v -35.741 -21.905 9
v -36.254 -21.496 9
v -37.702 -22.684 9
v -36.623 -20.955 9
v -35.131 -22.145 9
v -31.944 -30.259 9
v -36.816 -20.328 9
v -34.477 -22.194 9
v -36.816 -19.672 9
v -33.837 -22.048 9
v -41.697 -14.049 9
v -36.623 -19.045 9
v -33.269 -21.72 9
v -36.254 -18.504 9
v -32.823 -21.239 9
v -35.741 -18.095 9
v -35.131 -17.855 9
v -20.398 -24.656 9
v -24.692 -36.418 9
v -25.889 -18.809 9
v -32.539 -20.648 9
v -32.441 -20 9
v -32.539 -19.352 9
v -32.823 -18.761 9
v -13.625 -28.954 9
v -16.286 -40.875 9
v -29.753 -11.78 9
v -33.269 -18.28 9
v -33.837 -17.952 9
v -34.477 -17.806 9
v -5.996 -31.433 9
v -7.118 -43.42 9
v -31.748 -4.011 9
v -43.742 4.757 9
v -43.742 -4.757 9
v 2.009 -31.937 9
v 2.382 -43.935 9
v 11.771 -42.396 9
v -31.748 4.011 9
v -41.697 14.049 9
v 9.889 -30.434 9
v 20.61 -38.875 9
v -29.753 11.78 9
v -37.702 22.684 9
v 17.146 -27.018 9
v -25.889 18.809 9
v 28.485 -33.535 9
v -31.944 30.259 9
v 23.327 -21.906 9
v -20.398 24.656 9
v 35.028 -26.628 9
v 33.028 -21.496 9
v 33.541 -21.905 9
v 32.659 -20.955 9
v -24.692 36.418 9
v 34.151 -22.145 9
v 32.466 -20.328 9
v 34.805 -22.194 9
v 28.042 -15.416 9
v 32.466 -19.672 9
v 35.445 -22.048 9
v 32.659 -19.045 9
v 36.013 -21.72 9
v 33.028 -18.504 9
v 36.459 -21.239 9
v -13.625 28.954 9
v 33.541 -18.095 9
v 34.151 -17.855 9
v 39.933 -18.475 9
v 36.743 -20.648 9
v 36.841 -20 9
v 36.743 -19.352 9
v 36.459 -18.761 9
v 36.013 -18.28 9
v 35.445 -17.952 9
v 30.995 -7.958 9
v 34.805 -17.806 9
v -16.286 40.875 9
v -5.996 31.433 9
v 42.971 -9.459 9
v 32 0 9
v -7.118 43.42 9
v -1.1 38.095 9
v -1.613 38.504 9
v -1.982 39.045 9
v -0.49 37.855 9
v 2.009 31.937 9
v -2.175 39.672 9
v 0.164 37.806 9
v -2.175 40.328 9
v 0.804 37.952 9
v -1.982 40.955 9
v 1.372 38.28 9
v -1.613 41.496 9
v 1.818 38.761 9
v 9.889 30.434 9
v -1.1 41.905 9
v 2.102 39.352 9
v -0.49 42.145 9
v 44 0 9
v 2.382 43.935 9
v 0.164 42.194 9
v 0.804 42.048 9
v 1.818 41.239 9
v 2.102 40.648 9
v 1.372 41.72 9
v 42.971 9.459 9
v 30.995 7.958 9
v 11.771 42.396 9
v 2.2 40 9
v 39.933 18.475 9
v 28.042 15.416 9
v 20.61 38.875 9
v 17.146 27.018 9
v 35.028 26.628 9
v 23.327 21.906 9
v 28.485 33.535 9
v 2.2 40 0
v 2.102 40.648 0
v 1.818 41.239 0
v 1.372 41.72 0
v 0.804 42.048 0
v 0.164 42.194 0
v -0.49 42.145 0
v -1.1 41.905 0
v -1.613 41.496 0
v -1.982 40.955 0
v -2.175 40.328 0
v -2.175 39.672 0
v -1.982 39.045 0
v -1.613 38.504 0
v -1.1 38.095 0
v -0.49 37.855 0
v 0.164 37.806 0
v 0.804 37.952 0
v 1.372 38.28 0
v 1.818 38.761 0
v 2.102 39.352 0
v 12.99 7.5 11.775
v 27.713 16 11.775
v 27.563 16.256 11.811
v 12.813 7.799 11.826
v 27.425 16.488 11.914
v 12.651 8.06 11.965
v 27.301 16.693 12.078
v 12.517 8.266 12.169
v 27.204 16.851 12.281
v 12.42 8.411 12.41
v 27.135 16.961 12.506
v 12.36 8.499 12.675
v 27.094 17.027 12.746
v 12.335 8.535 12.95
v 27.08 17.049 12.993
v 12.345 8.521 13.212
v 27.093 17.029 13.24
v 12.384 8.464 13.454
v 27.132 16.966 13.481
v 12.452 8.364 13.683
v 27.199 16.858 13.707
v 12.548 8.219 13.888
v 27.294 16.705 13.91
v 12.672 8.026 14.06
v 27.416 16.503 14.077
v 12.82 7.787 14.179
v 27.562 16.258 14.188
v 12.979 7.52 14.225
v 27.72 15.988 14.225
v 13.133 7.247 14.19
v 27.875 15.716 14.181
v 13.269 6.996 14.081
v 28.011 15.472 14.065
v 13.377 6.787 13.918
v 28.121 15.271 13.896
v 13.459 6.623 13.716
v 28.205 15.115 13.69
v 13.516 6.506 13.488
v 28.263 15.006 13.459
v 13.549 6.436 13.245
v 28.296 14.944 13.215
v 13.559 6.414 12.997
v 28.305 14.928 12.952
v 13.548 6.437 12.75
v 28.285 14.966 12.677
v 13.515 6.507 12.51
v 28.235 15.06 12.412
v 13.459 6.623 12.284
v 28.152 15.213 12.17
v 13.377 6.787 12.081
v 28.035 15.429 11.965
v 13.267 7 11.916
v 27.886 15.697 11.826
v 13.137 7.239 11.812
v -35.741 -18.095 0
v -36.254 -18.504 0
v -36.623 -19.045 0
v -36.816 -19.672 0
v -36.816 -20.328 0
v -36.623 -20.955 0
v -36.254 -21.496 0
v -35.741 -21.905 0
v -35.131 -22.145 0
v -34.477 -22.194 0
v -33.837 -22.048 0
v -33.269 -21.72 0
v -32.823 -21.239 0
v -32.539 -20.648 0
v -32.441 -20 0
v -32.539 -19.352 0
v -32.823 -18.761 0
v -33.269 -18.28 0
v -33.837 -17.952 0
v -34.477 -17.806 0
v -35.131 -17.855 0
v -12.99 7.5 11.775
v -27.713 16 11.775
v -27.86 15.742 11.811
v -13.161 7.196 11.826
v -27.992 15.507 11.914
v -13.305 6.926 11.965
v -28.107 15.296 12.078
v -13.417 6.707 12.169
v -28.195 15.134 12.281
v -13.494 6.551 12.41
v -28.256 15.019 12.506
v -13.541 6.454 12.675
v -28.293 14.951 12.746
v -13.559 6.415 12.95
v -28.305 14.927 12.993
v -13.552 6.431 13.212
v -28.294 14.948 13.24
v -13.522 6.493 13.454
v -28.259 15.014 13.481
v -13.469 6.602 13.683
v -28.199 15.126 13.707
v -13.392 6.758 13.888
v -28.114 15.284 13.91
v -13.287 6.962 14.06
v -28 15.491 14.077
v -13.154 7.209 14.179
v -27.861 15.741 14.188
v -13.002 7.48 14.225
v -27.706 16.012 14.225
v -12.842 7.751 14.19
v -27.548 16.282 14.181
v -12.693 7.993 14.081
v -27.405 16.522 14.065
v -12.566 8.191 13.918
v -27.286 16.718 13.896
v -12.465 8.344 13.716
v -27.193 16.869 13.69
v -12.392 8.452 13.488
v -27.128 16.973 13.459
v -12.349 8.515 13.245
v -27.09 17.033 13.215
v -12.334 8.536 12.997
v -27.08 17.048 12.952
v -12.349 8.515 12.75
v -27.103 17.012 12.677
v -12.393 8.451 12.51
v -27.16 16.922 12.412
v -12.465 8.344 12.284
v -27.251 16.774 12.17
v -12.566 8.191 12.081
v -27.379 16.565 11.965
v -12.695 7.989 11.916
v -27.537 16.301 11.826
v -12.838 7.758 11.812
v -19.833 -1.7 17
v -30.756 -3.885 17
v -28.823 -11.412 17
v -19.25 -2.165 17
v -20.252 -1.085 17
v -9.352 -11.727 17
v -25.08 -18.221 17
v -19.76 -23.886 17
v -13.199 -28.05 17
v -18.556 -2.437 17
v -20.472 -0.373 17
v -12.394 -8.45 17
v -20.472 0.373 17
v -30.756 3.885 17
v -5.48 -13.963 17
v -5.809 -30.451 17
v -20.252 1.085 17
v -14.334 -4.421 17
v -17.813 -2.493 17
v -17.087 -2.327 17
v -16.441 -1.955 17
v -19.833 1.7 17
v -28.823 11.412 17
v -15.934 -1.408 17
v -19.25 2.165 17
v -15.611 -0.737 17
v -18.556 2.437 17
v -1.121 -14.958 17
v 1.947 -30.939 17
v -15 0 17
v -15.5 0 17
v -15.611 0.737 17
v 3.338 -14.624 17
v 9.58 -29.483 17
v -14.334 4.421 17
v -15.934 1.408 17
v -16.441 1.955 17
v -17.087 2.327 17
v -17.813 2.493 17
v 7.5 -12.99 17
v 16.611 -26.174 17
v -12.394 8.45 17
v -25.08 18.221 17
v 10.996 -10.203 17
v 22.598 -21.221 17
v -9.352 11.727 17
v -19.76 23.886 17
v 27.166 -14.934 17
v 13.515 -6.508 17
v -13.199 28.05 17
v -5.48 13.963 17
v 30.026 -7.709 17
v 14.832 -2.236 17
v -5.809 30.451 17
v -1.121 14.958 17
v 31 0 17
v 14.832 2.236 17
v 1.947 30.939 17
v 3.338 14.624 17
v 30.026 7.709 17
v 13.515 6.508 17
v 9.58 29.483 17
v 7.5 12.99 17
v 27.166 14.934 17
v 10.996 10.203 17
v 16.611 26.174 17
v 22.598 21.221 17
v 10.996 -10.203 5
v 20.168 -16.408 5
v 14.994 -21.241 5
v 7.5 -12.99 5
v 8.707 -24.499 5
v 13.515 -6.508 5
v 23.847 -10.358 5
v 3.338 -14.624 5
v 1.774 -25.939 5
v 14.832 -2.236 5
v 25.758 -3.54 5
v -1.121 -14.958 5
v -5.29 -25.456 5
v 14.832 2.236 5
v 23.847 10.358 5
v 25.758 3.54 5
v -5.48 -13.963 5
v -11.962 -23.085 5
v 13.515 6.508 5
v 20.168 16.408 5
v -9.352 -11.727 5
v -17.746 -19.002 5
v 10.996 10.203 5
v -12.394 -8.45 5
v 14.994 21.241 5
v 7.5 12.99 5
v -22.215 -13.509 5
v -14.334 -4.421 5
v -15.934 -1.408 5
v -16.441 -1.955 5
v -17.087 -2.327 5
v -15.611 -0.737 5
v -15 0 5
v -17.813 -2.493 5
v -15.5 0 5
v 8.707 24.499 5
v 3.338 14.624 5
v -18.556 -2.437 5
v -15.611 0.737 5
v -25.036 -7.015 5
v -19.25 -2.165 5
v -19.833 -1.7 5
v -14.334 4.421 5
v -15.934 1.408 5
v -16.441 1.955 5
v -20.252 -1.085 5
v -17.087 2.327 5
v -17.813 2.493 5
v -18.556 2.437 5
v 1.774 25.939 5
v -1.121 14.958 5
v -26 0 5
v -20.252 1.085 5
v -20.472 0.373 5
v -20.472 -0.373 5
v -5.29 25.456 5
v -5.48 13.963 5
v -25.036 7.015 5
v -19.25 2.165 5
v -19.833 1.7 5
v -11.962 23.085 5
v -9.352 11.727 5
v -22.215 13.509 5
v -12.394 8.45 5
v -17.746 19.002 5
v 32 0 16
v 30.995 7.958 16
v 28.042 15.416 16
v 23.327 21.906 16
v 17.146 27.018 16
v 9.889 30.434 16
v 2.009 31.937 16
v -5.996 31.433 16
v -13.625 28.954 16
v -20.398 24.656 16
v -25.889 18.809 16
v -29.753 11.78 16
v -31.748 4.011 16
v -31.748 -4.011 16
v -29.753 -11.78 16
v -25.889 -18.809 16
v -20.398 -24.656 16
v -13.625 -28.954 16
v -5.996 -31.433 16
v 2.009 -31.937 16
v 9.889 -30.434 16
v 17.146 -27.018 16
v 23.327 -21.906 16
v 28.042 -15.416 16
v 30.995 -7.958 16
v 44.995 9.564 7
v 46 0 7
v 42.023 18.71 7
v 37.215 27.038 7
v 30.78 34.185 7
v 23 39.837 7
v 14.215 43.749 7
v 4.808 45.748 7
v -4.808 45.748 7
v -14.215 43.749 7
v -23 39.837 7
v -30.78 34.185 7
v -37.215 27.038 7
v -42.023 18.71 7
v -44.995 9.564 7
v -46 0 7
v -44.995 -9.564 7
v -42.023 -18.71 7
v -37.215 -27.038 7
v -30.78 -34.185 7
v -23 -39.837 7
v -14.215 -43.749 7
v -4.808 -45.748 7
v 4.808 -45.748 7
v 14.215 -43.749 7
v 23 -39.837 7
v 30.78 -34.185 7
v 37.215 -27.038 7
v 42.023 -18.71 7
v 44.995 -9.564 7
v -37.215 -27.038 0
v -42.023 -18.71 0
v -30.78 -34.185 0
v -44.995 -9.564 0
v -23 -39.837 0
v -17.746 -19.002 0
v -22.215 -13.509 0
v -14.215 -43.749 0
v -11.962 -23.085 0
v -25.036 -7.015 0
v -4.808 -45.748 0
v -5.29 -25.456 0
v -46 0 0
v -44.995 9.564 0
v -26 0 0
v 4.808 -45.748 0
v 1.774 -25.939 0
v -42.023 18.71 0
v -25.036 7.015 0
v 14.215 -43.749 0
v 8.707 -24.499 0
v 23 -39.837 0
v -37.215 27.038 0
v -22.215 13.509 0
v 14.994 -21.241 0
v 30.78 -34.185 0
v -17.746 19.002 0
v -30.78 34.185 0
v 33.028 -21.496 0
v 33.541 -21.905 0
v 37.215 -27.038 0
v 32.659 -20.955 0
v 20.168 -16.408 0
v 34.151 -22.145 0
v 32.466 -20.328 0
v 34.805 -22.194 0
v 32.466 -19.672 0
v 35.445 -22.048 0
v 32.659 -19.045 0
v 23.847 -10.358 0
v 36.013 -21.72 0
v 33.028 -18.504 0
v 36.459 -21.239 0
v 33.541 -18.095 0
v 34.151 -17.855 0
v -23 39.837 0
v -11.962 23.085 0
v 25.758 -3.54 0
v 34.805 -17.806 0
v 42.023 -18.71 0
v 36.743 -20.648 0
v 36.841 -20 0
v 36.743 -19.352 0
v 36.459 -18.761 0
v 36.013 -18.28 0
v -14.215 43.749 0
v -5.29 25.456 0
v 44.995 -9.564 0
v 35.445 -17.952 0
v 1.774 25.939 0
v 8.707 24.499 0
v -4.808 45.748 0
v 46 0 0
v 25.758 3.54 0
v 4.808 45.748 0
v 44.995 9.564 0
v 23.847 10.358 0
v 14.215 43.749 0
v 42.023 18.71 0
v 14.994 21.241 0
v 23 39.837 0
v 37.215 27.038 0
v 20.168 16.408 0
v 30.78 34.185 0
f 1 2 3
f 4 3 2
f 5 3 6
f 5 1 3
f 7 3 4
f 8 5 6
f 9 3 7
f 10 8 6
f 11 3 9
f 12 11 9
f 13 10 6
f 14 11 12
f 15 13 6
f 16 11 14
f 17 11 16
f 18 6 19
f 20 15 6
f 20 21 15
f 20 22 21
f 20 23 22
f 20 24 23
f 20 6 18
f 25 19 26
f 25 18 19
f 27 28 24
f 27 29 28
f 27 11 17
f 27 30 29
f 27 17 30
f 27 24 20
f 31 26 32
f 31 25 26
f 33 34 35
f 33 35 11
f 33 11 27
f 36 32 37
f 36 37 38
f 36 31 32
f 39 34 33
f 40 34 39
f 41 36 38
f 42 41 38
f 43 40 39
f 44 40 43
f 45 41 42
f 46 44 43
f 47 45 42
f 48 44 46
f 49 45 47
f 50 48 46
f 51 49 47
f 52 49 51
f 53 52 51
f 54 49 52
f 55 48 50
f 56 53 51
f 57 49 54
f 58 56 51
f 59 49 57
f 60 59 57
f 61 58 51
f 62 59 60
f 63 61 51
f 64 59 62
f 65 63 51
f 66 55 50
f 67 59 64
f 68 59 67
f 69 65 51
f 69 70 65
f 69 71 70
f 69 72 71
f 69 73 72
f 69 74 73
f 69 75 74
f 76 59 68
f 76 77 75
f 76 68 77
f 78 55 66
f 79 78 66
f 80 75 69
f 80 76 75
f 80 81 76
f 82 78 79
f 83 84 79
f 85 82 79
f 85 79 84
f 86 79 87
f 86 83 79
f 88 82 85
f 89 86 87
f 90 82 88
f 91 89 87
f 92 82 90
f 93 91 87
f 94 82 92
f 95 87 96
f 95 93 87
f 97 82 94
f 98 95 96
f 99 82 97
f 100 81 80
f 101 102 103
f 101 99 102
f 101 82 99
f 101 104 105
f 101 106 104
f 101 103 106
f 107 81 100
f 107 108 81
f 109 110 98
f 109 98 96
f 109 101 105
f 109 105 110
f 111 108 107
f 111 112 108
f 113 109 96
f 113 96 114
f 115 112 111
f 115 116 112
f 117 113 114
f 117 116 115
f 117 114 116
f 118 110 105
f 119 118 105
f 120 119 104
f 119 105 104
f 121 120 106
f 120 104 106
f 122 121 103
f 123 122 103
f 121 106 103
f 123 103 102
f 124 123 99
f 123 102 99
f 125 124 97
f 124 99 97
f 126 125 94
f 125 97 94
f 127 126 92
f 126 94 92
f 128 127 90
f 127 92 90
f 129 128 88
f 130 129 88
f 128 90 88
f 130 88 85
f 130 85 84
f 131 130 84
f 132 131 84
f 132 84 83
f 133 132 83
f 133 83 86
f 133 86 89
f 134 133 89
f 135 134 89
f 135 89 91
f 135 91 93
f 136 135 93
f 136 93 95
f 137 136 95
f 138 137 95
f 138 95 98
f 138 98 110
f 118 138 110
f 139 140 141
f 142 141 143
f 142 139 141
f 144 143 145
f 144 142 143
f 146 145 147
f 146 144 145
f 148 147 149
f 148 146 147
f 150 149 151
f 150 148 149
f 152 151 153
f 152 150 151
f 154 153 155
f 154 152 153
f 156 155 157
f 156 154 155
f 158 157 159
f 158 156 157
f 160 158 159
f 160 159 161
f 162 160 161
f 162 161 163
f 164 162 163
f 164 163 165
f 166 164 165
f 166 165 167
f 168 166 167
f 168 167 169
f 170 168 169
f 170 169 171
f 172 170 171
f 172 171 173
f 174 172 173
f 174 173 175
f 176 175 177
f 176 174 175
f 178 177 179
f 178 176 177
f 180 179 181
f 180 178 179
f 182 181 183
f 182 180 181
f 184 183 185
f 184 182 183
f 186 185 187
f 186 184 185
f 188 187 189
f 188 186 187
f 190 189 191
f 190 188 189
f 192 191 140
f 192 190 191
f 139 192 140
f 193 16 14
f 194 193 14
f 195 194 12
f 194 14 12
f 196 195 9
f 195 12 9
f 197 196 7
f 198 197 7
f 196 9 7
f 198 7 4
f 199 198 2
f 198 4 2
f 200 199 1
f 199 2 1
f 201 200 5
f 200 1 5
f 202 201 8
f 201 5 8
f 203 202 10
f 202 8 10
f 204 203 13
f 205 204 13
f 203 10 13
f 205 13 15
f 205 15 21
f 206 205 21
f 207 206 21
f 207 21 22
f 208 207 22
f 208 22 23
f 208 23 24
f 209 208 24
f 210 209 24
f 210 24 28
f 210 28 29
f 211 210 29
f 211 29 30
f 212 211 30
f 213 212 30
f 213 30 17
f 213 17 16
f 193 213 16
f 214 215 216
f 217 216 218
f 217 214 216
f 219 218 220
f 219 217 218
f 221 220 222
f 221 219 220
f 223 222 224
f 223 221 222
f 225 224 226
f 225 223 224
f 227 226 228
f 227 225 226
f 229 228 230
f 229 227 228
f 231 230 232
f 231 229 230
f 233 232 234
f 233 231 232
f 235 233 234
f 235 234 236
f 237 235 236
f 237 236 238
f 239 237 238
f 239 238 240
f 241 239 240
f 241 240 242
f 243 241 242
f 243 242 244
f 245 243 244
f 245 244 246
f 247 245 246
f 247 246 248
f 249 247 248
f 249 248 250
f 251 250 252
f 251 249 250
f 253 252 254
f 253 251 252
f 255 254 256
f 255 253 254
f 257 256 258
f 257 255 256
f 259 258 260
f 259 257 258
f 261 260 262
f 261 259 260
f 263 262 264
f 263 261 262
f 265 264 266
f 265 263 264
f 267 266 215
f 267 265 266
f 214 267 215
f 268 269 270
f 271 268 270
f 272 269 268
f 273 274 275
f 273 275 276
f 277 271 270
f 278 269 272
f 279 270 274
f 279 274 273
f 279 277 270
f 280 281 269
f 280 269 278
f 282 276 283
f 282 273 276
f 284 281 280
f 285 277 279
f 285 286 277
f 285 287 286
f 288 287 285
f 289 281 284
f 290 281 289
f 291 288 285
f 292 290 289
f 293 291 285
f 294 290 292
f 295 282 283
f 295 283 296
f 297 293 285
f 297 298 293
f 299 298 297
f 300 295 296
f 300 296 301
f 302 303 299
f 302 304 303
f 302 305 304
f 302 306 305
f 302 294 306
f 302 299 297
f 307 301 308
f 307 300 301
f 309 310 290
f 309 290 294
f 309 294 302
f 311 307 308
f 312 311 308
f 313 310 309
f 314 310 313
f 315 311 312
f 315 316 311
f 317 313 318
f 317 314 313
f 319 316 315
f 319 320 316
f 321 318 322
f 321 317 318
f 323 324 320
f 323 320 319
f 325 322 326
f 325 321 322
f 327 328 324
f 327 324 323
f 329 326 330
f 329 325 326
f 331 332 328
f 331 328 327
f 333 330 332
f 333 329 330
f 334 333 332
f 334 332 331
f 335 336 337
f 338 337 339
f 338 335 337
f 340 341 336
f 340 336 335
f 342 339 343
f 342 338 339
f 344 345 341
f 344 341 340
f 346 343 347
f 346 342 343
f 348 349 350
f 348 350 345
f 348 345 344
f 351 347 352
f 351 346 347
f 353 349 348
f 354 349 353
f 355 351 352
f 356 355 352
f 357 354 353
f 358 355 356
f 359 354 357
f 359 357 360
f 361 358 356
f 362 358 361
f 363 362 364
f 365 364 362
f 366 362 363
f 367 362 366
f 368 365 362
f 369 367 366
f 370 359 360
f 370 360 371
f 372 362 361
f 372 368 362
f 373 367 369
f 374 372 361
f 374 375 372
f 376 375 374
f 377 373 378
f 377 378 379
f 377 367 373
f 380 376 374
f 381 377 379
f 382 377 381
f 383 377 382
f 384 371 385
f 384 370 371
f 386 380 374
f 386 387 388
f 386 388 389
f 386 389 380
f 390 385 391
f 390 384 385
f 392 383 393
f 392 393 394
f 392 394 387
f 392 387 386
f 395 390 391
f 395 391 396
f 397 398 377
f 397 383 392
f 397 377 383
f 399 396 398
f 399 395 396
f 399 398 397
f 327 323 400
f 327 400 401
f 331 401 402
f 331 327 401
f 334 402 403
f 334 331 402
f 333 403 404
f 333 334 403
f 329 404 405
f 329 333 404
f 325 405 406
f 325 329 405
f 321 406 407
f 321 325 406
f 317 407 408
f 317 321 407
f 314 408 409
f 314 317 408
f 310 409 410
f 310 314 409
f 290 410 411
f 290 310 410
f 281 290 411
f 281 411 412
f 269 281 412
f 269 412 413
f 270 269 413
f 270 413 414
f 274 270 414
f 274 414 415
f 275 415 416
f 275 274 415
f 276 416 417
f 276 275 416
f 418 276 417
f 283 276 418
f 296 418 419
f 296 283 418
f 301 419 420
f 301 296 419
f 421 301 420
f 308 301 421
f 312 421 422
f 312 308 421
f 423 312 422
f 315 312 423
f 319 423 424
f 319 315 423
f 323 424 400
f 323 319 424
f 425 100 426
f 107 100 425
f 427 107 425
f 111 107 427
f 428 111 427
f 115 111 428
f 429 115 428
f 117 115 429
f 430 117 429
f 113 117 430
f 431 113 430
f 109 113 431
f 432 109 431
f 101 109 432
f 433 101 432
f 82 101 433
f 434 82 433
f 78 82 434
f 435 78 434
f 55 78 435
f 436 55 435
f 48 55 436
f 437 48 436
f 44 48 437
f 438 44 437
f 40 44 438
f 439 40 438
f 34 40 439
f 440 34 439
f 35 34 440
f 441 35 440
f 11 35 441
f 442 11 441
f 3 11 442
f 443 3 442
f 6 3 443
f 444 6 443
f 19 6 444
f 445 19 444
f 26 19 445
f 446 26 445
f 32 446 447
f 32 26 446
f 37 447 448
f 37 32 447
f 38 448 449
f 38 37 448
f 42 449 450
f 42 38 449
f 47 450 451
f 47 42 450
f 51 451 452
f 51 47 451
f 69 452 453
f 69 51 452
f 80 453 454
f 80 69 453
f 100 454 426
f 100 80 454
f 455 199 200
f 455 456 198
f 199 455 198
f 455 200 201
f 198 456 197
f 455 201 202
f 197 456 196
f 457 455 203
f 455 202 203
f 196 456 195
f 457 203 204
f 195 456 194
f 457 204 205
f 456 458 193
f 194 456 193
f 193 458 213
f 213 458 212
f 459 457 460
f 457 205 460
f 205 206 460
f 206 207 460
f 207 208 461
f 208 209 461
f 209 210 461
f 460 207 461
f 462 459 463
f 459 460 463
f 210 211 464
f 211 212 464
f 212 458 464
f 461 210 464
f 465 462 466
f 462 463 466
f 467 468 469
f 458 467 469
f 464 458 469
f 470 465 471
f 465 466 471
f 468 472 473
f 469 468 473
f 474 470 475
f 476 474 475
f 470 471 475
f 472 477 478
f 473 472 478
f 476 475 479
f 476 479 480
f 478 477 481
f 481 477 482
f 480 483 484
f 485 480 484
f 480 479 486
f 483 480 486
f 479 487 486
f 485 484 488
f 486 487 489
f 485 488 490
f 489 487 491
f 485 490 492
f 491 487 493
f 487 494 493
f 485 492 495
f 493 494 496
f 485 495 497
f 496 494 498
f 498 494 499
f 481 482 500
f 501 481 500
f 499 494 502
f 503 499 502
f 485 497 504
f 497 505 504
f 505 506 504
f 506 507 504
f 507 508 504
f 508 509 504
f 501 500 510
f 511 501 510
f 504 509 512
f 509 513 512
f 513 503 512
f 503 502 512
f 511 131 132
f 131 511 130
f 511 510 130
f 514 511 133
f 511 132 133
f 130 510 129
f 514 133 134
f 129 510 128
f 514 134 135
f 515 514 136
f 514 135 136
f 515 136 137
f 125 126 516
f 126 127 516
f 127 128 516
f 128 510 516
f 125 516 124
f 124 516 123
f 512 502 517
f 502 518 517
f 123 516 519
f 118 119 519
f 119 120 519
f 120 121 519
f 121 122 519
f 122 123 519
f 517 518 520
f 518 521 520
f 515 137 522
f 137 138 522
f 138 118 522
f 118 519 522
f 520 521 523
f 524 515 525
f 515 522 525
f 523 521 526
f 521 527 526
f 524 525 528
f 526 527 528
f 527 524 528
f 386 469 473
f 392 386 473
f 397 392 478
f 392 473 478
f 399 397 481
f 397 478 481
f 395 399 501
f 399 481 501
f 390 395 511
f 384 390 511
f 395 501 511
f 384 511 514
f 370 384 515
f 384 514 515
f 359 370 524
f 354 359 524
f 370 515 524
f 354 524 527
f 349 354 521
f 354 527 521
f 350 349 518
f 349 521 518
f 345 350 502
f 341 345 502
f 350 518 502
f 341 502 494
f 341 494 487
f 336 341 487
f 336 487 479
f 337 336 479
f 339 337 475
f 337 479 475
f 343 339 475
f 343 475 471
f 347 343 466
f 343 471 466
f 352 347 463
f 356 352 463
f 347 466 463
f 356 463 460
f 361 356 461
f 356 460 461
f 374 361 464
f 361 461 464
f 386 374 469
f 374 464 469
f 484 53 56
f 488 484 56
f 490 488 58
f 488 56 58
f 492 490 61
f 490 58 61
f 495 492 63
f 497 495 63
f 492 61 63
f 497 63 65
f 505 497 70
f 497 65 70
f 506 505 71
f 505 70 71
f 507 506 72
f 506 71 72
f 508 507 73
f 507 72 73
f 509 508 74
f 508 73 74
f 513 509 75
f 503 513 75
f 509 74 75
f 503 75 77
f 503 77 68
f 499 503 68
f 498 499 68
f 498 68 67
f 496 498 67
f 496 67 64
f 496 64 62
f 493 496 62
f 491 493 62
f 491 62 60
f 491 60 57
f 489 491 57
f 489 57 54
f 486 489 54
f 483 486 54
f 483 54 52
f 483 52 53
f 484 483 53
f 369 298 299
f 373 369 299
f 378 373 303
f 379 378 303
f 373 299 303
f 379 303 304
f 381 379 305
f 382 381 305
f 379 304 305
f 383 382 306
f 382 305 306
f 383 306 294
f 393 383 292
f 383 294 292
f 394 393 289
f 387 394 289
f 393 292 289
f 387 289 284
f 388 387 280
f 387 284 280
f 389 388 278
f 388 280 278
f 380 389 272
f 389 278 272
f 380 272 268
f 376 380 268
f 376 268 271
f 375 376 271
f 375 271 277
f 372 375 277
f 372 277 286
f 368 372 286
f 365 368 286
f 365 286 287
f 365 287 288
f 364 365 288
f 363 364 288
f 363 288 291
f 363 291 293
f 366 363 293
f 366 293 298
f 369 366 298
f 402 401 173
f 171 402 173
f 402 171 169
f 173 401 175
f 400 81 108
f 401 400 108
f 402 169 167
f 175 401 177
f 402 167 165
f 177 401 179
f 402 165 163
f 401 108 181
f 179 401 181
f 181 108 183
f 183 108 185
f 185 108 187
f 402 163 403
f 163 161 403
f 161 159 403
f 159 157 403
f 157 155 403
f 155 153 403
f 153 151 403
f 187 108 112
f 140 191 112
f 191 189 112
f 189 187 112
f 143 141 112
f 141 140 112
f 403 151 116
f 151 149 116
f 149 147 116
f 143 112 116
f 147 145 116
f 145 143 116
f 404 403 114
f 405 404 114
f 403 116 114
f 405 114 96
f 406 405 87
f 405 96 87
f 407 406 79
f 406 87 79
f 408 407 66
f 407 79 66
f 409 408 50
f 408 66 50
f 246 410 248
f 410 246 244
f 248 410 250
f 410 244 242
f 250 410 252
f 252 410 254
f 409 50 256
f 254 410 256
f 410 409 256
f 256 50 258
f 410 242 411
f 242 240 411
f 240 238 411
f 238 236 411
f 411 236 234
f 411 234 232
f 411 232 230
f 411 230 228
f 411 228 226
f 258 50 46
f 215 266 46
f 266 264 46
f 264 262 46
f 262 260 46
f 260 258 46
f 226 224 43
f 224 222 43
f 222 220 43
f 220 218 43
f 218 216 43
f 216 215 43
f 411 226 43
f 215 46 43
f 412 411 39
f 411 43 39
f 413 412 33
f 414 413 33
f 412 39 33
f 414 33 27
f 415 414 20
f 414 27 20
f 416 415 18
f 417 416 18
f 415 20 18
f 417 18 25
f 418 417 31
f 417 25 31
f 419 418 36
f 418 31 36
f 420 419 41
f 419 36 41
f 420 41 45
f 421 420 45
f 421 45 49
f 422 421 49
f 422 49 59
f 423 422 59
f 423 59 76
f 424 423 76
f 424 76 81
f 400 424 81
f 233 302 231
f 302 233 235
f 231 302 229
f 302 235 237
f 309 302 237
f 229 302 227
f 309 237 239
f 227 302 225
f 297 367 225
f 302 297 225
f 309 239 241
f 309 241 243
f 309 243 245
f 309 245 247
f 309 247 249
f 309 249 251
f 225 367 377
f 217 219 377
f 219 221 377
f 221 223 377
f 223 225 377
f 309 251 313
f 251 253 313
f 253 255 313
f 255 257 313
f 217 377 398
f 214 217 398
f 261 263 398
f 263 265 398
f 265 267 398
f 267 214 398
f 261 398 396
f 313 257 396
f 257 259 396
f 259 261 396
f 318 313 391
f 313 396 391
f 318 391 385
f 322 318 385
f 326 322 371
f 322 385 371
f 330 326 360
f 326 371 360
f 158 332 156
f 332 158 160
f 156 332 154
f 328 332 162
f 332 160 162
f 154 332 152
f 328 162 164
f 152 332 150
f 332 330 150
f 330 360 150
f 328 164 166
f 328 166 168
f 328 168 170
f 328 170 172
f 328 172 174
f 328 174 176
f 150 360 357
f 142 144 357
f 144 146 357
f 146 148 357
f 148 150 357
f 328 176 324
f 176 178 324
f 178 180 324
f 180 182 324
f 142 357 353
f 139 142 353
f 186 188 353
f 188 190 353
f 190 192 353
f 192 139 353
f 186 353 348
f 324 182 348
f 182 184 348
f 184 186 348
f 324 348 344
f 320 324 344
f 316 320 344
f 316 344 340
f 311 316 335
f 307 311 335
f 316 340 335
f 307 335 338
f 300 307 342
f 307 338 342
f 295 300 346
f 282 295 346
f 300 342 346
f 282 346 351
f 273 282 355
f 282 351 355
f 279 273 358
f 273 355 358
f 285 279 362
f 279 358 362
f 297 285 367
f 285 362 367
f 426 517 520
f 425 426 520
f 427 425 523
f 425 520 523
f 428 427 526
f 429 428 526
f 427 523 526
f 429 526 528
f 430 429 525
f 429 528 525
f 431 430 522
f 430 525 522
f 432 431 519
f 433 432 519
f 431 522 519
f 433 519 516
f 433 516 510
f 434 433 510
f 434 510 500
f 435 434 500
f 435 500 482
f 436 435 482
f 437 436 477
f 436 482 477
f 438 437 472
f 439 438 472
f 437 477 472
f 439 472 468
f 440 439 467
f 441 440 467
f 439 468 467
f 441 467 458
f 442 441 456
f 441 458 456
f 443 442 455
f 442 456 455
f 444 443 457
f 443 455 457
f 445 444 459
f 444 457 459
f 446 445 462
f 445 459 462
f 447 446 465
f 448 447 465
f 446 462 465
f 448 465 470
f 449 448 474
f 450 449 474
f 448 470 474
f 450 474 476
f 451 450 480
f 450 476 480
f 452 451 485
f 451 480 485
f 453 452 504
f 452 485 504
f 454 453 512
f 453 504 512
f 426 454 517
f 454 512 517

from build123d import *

# Parameters (mm, degrees)
ESQUISSE1_R                  = 46
BASE_EXTRUSION_DEPTH         = 9
ESQUISSE2_R                  = 32
BOSS_EXTRU_1_DEPTH           = 8
ESQUISSE3_R                  = 26
ENL_V_MAT_EXTRU_1_DEPTH      = 5
ESQUISSE4_R                  = 15
ENL_V_MAT_EXTRU_2_DEPTH      = 13
ESQUISSE5_R                  = 2.2
ENL_V_MAT_EXTRU_3_DEPTH      = 10
R_P_TITION_CIRCULAIRE1_COUNT = 3
CHANFREIN1_SIZE              = 2
CHANFREIN2_SIZE              = 1
ENL_V_START                  = -17.050105
ESQUISSE8_R                  = 1.225
ENL_V_MAT_EXTRU_4_DEPTH      = 17.050105
R_P_TITION_CIRCULAIRE2_COUNT = 2
R_P_TITION_CIRCULAIRE2_ANGLE = 120
ESQUISSE9_R                  = 2.5
ENL_V_MAT_EXTRU_5_DEPTH      = 18


with BuildPart() as part:
    # Esquisse1 → Base-Extrusion (new body)
    with BuildSketch(Plane.XY):
        Circle(ESQUISSE1_R)
    extrude(amount=BASE_EXTRUSION_DEPTH)

    # Esquisse2 → Boss.-Extru.1 (add)
    with BuildSketch(Plane.XY.offset(9)):
        Circle(ESQUISSE2_R)
    extrude(amount=BOSS_EXTRU_1_DEPTH)

    # Esquisse3 → Enlèv. mat.-Extru.1 (cut)
    with BuildSketch(Plane(origin=(0, 0, 0), x_dir=(-1, 0, 0), z_dir=(0, 0, -1))):
        Circle(ESQUISSE3_R)
    extrude(amount=-ENL_V_MAT_EXTRU_1_DEPTH, mode=Mode.SUBTRACT)

    # Esquisse4 → Enlèv. mat.-Extru.2 (cut, through all)
    with BuildSketch(Plane(origin=(0, 0, 5), x_dir=(-1, 0, 0), z_dir=(0, 0, -1))):
        Circle(ESQUISSE4_R)
    extrude(amount=-ENL_V_MAT_EXTRU_2_DEPTH, mode=Mode.SUBTRACT)

    # Esquisse5 → Enlèv. mat.-Extru.3 (cut, through all)
    with BuildSketch(Plane.XY.offset(9)):
        with Locations((0, 40)):
            Circle(ESQUISSE5_R)
    enl_v_mat_extru_3 = extrude(amount=-ENL_V_MAT_EXTRU_3_DEPTH, mode=Mode.SUBTRACT)

    # Répétition circulaire1: Enlèv. mat.-Extru.3 ×3 about axis
    r_p_tition_circulaire1_axis = Axis((0, 0, 0), (0, 0, 1))
    for i in range(1, R_P_TITION_CIRCULAIRE1_COUNT):
        add(enl_v_mat_extru_3.rotate(r_p_tition_circulaire1_axis, i * 360 / R_P_TITION_CIRCULAIRE1_COUNT), mode=Mode.SUBTRACT)

    # Chanfrein1
    chanfrein1_edges = [part.edges().sort_by_distance(p)[0] for p in [
        (-46, 0, 9),
    ]]
    chamfer(chanfrein1_edges, length=CHANFREIN1_SIZE)

    # Chanfrein2
    chanfrein2_edges = [part.edges().sort_by_distance(p)[0] for p in [
        (-32, 0, 17),
    ]]
    chamfer(chanfrein2_edges, length=CHANFREIN2_SIZE)

    # Esquisse8 → Enlèv. mat.-Extru.4 (cut)
    with BuildSketch(Plane(origin=(27.712812921, 16, 0), x_dir=(0, 0, -1), z_dir=(0.866025404, 0.5, 0)).offset(ENL_V_START)):
        with Locations((-13, 0)):
            Circle(ESQUISSE8_R)
    enl_v_mat_extru_4 = extrude(amount=ENL_V_MAT_EXTRU_4_DEPTH, mode=Mode.SUBTRACT)

    # Répétition circulaire2: Enlèv. mat.-Extru.4 ×2 about axis
    r_p_tition_circulaire2_axis = Axis((0, 0, 17), (0, 0, 1))
    for i in range(1, R_P_TITION_CIRCULAIRE2_COUNT):
        add(enl_v_mat_extru_4.rotate(r_p_tition_circulaire2_axis, i * R_P_TITION_CIRCULAIRE2_ANGLE / (R_P_TITION_CIRCULAIRE2_COUNT - 1)), mode=Mode.SUBTRACT)

    # Esquisse9 → Enlèv. mat.-Extru.5 (cut, through all)
    with BuildSketch(Plane.XY.offset(17)):
        with Locations((-18, 0)):
            Circle(ESQUISSE9_R)
    extrude(amount=-ENL_V_MAT_EXTRU_5_DEPTH, mode=Mode.SUBTRACT)


solid = part.part
